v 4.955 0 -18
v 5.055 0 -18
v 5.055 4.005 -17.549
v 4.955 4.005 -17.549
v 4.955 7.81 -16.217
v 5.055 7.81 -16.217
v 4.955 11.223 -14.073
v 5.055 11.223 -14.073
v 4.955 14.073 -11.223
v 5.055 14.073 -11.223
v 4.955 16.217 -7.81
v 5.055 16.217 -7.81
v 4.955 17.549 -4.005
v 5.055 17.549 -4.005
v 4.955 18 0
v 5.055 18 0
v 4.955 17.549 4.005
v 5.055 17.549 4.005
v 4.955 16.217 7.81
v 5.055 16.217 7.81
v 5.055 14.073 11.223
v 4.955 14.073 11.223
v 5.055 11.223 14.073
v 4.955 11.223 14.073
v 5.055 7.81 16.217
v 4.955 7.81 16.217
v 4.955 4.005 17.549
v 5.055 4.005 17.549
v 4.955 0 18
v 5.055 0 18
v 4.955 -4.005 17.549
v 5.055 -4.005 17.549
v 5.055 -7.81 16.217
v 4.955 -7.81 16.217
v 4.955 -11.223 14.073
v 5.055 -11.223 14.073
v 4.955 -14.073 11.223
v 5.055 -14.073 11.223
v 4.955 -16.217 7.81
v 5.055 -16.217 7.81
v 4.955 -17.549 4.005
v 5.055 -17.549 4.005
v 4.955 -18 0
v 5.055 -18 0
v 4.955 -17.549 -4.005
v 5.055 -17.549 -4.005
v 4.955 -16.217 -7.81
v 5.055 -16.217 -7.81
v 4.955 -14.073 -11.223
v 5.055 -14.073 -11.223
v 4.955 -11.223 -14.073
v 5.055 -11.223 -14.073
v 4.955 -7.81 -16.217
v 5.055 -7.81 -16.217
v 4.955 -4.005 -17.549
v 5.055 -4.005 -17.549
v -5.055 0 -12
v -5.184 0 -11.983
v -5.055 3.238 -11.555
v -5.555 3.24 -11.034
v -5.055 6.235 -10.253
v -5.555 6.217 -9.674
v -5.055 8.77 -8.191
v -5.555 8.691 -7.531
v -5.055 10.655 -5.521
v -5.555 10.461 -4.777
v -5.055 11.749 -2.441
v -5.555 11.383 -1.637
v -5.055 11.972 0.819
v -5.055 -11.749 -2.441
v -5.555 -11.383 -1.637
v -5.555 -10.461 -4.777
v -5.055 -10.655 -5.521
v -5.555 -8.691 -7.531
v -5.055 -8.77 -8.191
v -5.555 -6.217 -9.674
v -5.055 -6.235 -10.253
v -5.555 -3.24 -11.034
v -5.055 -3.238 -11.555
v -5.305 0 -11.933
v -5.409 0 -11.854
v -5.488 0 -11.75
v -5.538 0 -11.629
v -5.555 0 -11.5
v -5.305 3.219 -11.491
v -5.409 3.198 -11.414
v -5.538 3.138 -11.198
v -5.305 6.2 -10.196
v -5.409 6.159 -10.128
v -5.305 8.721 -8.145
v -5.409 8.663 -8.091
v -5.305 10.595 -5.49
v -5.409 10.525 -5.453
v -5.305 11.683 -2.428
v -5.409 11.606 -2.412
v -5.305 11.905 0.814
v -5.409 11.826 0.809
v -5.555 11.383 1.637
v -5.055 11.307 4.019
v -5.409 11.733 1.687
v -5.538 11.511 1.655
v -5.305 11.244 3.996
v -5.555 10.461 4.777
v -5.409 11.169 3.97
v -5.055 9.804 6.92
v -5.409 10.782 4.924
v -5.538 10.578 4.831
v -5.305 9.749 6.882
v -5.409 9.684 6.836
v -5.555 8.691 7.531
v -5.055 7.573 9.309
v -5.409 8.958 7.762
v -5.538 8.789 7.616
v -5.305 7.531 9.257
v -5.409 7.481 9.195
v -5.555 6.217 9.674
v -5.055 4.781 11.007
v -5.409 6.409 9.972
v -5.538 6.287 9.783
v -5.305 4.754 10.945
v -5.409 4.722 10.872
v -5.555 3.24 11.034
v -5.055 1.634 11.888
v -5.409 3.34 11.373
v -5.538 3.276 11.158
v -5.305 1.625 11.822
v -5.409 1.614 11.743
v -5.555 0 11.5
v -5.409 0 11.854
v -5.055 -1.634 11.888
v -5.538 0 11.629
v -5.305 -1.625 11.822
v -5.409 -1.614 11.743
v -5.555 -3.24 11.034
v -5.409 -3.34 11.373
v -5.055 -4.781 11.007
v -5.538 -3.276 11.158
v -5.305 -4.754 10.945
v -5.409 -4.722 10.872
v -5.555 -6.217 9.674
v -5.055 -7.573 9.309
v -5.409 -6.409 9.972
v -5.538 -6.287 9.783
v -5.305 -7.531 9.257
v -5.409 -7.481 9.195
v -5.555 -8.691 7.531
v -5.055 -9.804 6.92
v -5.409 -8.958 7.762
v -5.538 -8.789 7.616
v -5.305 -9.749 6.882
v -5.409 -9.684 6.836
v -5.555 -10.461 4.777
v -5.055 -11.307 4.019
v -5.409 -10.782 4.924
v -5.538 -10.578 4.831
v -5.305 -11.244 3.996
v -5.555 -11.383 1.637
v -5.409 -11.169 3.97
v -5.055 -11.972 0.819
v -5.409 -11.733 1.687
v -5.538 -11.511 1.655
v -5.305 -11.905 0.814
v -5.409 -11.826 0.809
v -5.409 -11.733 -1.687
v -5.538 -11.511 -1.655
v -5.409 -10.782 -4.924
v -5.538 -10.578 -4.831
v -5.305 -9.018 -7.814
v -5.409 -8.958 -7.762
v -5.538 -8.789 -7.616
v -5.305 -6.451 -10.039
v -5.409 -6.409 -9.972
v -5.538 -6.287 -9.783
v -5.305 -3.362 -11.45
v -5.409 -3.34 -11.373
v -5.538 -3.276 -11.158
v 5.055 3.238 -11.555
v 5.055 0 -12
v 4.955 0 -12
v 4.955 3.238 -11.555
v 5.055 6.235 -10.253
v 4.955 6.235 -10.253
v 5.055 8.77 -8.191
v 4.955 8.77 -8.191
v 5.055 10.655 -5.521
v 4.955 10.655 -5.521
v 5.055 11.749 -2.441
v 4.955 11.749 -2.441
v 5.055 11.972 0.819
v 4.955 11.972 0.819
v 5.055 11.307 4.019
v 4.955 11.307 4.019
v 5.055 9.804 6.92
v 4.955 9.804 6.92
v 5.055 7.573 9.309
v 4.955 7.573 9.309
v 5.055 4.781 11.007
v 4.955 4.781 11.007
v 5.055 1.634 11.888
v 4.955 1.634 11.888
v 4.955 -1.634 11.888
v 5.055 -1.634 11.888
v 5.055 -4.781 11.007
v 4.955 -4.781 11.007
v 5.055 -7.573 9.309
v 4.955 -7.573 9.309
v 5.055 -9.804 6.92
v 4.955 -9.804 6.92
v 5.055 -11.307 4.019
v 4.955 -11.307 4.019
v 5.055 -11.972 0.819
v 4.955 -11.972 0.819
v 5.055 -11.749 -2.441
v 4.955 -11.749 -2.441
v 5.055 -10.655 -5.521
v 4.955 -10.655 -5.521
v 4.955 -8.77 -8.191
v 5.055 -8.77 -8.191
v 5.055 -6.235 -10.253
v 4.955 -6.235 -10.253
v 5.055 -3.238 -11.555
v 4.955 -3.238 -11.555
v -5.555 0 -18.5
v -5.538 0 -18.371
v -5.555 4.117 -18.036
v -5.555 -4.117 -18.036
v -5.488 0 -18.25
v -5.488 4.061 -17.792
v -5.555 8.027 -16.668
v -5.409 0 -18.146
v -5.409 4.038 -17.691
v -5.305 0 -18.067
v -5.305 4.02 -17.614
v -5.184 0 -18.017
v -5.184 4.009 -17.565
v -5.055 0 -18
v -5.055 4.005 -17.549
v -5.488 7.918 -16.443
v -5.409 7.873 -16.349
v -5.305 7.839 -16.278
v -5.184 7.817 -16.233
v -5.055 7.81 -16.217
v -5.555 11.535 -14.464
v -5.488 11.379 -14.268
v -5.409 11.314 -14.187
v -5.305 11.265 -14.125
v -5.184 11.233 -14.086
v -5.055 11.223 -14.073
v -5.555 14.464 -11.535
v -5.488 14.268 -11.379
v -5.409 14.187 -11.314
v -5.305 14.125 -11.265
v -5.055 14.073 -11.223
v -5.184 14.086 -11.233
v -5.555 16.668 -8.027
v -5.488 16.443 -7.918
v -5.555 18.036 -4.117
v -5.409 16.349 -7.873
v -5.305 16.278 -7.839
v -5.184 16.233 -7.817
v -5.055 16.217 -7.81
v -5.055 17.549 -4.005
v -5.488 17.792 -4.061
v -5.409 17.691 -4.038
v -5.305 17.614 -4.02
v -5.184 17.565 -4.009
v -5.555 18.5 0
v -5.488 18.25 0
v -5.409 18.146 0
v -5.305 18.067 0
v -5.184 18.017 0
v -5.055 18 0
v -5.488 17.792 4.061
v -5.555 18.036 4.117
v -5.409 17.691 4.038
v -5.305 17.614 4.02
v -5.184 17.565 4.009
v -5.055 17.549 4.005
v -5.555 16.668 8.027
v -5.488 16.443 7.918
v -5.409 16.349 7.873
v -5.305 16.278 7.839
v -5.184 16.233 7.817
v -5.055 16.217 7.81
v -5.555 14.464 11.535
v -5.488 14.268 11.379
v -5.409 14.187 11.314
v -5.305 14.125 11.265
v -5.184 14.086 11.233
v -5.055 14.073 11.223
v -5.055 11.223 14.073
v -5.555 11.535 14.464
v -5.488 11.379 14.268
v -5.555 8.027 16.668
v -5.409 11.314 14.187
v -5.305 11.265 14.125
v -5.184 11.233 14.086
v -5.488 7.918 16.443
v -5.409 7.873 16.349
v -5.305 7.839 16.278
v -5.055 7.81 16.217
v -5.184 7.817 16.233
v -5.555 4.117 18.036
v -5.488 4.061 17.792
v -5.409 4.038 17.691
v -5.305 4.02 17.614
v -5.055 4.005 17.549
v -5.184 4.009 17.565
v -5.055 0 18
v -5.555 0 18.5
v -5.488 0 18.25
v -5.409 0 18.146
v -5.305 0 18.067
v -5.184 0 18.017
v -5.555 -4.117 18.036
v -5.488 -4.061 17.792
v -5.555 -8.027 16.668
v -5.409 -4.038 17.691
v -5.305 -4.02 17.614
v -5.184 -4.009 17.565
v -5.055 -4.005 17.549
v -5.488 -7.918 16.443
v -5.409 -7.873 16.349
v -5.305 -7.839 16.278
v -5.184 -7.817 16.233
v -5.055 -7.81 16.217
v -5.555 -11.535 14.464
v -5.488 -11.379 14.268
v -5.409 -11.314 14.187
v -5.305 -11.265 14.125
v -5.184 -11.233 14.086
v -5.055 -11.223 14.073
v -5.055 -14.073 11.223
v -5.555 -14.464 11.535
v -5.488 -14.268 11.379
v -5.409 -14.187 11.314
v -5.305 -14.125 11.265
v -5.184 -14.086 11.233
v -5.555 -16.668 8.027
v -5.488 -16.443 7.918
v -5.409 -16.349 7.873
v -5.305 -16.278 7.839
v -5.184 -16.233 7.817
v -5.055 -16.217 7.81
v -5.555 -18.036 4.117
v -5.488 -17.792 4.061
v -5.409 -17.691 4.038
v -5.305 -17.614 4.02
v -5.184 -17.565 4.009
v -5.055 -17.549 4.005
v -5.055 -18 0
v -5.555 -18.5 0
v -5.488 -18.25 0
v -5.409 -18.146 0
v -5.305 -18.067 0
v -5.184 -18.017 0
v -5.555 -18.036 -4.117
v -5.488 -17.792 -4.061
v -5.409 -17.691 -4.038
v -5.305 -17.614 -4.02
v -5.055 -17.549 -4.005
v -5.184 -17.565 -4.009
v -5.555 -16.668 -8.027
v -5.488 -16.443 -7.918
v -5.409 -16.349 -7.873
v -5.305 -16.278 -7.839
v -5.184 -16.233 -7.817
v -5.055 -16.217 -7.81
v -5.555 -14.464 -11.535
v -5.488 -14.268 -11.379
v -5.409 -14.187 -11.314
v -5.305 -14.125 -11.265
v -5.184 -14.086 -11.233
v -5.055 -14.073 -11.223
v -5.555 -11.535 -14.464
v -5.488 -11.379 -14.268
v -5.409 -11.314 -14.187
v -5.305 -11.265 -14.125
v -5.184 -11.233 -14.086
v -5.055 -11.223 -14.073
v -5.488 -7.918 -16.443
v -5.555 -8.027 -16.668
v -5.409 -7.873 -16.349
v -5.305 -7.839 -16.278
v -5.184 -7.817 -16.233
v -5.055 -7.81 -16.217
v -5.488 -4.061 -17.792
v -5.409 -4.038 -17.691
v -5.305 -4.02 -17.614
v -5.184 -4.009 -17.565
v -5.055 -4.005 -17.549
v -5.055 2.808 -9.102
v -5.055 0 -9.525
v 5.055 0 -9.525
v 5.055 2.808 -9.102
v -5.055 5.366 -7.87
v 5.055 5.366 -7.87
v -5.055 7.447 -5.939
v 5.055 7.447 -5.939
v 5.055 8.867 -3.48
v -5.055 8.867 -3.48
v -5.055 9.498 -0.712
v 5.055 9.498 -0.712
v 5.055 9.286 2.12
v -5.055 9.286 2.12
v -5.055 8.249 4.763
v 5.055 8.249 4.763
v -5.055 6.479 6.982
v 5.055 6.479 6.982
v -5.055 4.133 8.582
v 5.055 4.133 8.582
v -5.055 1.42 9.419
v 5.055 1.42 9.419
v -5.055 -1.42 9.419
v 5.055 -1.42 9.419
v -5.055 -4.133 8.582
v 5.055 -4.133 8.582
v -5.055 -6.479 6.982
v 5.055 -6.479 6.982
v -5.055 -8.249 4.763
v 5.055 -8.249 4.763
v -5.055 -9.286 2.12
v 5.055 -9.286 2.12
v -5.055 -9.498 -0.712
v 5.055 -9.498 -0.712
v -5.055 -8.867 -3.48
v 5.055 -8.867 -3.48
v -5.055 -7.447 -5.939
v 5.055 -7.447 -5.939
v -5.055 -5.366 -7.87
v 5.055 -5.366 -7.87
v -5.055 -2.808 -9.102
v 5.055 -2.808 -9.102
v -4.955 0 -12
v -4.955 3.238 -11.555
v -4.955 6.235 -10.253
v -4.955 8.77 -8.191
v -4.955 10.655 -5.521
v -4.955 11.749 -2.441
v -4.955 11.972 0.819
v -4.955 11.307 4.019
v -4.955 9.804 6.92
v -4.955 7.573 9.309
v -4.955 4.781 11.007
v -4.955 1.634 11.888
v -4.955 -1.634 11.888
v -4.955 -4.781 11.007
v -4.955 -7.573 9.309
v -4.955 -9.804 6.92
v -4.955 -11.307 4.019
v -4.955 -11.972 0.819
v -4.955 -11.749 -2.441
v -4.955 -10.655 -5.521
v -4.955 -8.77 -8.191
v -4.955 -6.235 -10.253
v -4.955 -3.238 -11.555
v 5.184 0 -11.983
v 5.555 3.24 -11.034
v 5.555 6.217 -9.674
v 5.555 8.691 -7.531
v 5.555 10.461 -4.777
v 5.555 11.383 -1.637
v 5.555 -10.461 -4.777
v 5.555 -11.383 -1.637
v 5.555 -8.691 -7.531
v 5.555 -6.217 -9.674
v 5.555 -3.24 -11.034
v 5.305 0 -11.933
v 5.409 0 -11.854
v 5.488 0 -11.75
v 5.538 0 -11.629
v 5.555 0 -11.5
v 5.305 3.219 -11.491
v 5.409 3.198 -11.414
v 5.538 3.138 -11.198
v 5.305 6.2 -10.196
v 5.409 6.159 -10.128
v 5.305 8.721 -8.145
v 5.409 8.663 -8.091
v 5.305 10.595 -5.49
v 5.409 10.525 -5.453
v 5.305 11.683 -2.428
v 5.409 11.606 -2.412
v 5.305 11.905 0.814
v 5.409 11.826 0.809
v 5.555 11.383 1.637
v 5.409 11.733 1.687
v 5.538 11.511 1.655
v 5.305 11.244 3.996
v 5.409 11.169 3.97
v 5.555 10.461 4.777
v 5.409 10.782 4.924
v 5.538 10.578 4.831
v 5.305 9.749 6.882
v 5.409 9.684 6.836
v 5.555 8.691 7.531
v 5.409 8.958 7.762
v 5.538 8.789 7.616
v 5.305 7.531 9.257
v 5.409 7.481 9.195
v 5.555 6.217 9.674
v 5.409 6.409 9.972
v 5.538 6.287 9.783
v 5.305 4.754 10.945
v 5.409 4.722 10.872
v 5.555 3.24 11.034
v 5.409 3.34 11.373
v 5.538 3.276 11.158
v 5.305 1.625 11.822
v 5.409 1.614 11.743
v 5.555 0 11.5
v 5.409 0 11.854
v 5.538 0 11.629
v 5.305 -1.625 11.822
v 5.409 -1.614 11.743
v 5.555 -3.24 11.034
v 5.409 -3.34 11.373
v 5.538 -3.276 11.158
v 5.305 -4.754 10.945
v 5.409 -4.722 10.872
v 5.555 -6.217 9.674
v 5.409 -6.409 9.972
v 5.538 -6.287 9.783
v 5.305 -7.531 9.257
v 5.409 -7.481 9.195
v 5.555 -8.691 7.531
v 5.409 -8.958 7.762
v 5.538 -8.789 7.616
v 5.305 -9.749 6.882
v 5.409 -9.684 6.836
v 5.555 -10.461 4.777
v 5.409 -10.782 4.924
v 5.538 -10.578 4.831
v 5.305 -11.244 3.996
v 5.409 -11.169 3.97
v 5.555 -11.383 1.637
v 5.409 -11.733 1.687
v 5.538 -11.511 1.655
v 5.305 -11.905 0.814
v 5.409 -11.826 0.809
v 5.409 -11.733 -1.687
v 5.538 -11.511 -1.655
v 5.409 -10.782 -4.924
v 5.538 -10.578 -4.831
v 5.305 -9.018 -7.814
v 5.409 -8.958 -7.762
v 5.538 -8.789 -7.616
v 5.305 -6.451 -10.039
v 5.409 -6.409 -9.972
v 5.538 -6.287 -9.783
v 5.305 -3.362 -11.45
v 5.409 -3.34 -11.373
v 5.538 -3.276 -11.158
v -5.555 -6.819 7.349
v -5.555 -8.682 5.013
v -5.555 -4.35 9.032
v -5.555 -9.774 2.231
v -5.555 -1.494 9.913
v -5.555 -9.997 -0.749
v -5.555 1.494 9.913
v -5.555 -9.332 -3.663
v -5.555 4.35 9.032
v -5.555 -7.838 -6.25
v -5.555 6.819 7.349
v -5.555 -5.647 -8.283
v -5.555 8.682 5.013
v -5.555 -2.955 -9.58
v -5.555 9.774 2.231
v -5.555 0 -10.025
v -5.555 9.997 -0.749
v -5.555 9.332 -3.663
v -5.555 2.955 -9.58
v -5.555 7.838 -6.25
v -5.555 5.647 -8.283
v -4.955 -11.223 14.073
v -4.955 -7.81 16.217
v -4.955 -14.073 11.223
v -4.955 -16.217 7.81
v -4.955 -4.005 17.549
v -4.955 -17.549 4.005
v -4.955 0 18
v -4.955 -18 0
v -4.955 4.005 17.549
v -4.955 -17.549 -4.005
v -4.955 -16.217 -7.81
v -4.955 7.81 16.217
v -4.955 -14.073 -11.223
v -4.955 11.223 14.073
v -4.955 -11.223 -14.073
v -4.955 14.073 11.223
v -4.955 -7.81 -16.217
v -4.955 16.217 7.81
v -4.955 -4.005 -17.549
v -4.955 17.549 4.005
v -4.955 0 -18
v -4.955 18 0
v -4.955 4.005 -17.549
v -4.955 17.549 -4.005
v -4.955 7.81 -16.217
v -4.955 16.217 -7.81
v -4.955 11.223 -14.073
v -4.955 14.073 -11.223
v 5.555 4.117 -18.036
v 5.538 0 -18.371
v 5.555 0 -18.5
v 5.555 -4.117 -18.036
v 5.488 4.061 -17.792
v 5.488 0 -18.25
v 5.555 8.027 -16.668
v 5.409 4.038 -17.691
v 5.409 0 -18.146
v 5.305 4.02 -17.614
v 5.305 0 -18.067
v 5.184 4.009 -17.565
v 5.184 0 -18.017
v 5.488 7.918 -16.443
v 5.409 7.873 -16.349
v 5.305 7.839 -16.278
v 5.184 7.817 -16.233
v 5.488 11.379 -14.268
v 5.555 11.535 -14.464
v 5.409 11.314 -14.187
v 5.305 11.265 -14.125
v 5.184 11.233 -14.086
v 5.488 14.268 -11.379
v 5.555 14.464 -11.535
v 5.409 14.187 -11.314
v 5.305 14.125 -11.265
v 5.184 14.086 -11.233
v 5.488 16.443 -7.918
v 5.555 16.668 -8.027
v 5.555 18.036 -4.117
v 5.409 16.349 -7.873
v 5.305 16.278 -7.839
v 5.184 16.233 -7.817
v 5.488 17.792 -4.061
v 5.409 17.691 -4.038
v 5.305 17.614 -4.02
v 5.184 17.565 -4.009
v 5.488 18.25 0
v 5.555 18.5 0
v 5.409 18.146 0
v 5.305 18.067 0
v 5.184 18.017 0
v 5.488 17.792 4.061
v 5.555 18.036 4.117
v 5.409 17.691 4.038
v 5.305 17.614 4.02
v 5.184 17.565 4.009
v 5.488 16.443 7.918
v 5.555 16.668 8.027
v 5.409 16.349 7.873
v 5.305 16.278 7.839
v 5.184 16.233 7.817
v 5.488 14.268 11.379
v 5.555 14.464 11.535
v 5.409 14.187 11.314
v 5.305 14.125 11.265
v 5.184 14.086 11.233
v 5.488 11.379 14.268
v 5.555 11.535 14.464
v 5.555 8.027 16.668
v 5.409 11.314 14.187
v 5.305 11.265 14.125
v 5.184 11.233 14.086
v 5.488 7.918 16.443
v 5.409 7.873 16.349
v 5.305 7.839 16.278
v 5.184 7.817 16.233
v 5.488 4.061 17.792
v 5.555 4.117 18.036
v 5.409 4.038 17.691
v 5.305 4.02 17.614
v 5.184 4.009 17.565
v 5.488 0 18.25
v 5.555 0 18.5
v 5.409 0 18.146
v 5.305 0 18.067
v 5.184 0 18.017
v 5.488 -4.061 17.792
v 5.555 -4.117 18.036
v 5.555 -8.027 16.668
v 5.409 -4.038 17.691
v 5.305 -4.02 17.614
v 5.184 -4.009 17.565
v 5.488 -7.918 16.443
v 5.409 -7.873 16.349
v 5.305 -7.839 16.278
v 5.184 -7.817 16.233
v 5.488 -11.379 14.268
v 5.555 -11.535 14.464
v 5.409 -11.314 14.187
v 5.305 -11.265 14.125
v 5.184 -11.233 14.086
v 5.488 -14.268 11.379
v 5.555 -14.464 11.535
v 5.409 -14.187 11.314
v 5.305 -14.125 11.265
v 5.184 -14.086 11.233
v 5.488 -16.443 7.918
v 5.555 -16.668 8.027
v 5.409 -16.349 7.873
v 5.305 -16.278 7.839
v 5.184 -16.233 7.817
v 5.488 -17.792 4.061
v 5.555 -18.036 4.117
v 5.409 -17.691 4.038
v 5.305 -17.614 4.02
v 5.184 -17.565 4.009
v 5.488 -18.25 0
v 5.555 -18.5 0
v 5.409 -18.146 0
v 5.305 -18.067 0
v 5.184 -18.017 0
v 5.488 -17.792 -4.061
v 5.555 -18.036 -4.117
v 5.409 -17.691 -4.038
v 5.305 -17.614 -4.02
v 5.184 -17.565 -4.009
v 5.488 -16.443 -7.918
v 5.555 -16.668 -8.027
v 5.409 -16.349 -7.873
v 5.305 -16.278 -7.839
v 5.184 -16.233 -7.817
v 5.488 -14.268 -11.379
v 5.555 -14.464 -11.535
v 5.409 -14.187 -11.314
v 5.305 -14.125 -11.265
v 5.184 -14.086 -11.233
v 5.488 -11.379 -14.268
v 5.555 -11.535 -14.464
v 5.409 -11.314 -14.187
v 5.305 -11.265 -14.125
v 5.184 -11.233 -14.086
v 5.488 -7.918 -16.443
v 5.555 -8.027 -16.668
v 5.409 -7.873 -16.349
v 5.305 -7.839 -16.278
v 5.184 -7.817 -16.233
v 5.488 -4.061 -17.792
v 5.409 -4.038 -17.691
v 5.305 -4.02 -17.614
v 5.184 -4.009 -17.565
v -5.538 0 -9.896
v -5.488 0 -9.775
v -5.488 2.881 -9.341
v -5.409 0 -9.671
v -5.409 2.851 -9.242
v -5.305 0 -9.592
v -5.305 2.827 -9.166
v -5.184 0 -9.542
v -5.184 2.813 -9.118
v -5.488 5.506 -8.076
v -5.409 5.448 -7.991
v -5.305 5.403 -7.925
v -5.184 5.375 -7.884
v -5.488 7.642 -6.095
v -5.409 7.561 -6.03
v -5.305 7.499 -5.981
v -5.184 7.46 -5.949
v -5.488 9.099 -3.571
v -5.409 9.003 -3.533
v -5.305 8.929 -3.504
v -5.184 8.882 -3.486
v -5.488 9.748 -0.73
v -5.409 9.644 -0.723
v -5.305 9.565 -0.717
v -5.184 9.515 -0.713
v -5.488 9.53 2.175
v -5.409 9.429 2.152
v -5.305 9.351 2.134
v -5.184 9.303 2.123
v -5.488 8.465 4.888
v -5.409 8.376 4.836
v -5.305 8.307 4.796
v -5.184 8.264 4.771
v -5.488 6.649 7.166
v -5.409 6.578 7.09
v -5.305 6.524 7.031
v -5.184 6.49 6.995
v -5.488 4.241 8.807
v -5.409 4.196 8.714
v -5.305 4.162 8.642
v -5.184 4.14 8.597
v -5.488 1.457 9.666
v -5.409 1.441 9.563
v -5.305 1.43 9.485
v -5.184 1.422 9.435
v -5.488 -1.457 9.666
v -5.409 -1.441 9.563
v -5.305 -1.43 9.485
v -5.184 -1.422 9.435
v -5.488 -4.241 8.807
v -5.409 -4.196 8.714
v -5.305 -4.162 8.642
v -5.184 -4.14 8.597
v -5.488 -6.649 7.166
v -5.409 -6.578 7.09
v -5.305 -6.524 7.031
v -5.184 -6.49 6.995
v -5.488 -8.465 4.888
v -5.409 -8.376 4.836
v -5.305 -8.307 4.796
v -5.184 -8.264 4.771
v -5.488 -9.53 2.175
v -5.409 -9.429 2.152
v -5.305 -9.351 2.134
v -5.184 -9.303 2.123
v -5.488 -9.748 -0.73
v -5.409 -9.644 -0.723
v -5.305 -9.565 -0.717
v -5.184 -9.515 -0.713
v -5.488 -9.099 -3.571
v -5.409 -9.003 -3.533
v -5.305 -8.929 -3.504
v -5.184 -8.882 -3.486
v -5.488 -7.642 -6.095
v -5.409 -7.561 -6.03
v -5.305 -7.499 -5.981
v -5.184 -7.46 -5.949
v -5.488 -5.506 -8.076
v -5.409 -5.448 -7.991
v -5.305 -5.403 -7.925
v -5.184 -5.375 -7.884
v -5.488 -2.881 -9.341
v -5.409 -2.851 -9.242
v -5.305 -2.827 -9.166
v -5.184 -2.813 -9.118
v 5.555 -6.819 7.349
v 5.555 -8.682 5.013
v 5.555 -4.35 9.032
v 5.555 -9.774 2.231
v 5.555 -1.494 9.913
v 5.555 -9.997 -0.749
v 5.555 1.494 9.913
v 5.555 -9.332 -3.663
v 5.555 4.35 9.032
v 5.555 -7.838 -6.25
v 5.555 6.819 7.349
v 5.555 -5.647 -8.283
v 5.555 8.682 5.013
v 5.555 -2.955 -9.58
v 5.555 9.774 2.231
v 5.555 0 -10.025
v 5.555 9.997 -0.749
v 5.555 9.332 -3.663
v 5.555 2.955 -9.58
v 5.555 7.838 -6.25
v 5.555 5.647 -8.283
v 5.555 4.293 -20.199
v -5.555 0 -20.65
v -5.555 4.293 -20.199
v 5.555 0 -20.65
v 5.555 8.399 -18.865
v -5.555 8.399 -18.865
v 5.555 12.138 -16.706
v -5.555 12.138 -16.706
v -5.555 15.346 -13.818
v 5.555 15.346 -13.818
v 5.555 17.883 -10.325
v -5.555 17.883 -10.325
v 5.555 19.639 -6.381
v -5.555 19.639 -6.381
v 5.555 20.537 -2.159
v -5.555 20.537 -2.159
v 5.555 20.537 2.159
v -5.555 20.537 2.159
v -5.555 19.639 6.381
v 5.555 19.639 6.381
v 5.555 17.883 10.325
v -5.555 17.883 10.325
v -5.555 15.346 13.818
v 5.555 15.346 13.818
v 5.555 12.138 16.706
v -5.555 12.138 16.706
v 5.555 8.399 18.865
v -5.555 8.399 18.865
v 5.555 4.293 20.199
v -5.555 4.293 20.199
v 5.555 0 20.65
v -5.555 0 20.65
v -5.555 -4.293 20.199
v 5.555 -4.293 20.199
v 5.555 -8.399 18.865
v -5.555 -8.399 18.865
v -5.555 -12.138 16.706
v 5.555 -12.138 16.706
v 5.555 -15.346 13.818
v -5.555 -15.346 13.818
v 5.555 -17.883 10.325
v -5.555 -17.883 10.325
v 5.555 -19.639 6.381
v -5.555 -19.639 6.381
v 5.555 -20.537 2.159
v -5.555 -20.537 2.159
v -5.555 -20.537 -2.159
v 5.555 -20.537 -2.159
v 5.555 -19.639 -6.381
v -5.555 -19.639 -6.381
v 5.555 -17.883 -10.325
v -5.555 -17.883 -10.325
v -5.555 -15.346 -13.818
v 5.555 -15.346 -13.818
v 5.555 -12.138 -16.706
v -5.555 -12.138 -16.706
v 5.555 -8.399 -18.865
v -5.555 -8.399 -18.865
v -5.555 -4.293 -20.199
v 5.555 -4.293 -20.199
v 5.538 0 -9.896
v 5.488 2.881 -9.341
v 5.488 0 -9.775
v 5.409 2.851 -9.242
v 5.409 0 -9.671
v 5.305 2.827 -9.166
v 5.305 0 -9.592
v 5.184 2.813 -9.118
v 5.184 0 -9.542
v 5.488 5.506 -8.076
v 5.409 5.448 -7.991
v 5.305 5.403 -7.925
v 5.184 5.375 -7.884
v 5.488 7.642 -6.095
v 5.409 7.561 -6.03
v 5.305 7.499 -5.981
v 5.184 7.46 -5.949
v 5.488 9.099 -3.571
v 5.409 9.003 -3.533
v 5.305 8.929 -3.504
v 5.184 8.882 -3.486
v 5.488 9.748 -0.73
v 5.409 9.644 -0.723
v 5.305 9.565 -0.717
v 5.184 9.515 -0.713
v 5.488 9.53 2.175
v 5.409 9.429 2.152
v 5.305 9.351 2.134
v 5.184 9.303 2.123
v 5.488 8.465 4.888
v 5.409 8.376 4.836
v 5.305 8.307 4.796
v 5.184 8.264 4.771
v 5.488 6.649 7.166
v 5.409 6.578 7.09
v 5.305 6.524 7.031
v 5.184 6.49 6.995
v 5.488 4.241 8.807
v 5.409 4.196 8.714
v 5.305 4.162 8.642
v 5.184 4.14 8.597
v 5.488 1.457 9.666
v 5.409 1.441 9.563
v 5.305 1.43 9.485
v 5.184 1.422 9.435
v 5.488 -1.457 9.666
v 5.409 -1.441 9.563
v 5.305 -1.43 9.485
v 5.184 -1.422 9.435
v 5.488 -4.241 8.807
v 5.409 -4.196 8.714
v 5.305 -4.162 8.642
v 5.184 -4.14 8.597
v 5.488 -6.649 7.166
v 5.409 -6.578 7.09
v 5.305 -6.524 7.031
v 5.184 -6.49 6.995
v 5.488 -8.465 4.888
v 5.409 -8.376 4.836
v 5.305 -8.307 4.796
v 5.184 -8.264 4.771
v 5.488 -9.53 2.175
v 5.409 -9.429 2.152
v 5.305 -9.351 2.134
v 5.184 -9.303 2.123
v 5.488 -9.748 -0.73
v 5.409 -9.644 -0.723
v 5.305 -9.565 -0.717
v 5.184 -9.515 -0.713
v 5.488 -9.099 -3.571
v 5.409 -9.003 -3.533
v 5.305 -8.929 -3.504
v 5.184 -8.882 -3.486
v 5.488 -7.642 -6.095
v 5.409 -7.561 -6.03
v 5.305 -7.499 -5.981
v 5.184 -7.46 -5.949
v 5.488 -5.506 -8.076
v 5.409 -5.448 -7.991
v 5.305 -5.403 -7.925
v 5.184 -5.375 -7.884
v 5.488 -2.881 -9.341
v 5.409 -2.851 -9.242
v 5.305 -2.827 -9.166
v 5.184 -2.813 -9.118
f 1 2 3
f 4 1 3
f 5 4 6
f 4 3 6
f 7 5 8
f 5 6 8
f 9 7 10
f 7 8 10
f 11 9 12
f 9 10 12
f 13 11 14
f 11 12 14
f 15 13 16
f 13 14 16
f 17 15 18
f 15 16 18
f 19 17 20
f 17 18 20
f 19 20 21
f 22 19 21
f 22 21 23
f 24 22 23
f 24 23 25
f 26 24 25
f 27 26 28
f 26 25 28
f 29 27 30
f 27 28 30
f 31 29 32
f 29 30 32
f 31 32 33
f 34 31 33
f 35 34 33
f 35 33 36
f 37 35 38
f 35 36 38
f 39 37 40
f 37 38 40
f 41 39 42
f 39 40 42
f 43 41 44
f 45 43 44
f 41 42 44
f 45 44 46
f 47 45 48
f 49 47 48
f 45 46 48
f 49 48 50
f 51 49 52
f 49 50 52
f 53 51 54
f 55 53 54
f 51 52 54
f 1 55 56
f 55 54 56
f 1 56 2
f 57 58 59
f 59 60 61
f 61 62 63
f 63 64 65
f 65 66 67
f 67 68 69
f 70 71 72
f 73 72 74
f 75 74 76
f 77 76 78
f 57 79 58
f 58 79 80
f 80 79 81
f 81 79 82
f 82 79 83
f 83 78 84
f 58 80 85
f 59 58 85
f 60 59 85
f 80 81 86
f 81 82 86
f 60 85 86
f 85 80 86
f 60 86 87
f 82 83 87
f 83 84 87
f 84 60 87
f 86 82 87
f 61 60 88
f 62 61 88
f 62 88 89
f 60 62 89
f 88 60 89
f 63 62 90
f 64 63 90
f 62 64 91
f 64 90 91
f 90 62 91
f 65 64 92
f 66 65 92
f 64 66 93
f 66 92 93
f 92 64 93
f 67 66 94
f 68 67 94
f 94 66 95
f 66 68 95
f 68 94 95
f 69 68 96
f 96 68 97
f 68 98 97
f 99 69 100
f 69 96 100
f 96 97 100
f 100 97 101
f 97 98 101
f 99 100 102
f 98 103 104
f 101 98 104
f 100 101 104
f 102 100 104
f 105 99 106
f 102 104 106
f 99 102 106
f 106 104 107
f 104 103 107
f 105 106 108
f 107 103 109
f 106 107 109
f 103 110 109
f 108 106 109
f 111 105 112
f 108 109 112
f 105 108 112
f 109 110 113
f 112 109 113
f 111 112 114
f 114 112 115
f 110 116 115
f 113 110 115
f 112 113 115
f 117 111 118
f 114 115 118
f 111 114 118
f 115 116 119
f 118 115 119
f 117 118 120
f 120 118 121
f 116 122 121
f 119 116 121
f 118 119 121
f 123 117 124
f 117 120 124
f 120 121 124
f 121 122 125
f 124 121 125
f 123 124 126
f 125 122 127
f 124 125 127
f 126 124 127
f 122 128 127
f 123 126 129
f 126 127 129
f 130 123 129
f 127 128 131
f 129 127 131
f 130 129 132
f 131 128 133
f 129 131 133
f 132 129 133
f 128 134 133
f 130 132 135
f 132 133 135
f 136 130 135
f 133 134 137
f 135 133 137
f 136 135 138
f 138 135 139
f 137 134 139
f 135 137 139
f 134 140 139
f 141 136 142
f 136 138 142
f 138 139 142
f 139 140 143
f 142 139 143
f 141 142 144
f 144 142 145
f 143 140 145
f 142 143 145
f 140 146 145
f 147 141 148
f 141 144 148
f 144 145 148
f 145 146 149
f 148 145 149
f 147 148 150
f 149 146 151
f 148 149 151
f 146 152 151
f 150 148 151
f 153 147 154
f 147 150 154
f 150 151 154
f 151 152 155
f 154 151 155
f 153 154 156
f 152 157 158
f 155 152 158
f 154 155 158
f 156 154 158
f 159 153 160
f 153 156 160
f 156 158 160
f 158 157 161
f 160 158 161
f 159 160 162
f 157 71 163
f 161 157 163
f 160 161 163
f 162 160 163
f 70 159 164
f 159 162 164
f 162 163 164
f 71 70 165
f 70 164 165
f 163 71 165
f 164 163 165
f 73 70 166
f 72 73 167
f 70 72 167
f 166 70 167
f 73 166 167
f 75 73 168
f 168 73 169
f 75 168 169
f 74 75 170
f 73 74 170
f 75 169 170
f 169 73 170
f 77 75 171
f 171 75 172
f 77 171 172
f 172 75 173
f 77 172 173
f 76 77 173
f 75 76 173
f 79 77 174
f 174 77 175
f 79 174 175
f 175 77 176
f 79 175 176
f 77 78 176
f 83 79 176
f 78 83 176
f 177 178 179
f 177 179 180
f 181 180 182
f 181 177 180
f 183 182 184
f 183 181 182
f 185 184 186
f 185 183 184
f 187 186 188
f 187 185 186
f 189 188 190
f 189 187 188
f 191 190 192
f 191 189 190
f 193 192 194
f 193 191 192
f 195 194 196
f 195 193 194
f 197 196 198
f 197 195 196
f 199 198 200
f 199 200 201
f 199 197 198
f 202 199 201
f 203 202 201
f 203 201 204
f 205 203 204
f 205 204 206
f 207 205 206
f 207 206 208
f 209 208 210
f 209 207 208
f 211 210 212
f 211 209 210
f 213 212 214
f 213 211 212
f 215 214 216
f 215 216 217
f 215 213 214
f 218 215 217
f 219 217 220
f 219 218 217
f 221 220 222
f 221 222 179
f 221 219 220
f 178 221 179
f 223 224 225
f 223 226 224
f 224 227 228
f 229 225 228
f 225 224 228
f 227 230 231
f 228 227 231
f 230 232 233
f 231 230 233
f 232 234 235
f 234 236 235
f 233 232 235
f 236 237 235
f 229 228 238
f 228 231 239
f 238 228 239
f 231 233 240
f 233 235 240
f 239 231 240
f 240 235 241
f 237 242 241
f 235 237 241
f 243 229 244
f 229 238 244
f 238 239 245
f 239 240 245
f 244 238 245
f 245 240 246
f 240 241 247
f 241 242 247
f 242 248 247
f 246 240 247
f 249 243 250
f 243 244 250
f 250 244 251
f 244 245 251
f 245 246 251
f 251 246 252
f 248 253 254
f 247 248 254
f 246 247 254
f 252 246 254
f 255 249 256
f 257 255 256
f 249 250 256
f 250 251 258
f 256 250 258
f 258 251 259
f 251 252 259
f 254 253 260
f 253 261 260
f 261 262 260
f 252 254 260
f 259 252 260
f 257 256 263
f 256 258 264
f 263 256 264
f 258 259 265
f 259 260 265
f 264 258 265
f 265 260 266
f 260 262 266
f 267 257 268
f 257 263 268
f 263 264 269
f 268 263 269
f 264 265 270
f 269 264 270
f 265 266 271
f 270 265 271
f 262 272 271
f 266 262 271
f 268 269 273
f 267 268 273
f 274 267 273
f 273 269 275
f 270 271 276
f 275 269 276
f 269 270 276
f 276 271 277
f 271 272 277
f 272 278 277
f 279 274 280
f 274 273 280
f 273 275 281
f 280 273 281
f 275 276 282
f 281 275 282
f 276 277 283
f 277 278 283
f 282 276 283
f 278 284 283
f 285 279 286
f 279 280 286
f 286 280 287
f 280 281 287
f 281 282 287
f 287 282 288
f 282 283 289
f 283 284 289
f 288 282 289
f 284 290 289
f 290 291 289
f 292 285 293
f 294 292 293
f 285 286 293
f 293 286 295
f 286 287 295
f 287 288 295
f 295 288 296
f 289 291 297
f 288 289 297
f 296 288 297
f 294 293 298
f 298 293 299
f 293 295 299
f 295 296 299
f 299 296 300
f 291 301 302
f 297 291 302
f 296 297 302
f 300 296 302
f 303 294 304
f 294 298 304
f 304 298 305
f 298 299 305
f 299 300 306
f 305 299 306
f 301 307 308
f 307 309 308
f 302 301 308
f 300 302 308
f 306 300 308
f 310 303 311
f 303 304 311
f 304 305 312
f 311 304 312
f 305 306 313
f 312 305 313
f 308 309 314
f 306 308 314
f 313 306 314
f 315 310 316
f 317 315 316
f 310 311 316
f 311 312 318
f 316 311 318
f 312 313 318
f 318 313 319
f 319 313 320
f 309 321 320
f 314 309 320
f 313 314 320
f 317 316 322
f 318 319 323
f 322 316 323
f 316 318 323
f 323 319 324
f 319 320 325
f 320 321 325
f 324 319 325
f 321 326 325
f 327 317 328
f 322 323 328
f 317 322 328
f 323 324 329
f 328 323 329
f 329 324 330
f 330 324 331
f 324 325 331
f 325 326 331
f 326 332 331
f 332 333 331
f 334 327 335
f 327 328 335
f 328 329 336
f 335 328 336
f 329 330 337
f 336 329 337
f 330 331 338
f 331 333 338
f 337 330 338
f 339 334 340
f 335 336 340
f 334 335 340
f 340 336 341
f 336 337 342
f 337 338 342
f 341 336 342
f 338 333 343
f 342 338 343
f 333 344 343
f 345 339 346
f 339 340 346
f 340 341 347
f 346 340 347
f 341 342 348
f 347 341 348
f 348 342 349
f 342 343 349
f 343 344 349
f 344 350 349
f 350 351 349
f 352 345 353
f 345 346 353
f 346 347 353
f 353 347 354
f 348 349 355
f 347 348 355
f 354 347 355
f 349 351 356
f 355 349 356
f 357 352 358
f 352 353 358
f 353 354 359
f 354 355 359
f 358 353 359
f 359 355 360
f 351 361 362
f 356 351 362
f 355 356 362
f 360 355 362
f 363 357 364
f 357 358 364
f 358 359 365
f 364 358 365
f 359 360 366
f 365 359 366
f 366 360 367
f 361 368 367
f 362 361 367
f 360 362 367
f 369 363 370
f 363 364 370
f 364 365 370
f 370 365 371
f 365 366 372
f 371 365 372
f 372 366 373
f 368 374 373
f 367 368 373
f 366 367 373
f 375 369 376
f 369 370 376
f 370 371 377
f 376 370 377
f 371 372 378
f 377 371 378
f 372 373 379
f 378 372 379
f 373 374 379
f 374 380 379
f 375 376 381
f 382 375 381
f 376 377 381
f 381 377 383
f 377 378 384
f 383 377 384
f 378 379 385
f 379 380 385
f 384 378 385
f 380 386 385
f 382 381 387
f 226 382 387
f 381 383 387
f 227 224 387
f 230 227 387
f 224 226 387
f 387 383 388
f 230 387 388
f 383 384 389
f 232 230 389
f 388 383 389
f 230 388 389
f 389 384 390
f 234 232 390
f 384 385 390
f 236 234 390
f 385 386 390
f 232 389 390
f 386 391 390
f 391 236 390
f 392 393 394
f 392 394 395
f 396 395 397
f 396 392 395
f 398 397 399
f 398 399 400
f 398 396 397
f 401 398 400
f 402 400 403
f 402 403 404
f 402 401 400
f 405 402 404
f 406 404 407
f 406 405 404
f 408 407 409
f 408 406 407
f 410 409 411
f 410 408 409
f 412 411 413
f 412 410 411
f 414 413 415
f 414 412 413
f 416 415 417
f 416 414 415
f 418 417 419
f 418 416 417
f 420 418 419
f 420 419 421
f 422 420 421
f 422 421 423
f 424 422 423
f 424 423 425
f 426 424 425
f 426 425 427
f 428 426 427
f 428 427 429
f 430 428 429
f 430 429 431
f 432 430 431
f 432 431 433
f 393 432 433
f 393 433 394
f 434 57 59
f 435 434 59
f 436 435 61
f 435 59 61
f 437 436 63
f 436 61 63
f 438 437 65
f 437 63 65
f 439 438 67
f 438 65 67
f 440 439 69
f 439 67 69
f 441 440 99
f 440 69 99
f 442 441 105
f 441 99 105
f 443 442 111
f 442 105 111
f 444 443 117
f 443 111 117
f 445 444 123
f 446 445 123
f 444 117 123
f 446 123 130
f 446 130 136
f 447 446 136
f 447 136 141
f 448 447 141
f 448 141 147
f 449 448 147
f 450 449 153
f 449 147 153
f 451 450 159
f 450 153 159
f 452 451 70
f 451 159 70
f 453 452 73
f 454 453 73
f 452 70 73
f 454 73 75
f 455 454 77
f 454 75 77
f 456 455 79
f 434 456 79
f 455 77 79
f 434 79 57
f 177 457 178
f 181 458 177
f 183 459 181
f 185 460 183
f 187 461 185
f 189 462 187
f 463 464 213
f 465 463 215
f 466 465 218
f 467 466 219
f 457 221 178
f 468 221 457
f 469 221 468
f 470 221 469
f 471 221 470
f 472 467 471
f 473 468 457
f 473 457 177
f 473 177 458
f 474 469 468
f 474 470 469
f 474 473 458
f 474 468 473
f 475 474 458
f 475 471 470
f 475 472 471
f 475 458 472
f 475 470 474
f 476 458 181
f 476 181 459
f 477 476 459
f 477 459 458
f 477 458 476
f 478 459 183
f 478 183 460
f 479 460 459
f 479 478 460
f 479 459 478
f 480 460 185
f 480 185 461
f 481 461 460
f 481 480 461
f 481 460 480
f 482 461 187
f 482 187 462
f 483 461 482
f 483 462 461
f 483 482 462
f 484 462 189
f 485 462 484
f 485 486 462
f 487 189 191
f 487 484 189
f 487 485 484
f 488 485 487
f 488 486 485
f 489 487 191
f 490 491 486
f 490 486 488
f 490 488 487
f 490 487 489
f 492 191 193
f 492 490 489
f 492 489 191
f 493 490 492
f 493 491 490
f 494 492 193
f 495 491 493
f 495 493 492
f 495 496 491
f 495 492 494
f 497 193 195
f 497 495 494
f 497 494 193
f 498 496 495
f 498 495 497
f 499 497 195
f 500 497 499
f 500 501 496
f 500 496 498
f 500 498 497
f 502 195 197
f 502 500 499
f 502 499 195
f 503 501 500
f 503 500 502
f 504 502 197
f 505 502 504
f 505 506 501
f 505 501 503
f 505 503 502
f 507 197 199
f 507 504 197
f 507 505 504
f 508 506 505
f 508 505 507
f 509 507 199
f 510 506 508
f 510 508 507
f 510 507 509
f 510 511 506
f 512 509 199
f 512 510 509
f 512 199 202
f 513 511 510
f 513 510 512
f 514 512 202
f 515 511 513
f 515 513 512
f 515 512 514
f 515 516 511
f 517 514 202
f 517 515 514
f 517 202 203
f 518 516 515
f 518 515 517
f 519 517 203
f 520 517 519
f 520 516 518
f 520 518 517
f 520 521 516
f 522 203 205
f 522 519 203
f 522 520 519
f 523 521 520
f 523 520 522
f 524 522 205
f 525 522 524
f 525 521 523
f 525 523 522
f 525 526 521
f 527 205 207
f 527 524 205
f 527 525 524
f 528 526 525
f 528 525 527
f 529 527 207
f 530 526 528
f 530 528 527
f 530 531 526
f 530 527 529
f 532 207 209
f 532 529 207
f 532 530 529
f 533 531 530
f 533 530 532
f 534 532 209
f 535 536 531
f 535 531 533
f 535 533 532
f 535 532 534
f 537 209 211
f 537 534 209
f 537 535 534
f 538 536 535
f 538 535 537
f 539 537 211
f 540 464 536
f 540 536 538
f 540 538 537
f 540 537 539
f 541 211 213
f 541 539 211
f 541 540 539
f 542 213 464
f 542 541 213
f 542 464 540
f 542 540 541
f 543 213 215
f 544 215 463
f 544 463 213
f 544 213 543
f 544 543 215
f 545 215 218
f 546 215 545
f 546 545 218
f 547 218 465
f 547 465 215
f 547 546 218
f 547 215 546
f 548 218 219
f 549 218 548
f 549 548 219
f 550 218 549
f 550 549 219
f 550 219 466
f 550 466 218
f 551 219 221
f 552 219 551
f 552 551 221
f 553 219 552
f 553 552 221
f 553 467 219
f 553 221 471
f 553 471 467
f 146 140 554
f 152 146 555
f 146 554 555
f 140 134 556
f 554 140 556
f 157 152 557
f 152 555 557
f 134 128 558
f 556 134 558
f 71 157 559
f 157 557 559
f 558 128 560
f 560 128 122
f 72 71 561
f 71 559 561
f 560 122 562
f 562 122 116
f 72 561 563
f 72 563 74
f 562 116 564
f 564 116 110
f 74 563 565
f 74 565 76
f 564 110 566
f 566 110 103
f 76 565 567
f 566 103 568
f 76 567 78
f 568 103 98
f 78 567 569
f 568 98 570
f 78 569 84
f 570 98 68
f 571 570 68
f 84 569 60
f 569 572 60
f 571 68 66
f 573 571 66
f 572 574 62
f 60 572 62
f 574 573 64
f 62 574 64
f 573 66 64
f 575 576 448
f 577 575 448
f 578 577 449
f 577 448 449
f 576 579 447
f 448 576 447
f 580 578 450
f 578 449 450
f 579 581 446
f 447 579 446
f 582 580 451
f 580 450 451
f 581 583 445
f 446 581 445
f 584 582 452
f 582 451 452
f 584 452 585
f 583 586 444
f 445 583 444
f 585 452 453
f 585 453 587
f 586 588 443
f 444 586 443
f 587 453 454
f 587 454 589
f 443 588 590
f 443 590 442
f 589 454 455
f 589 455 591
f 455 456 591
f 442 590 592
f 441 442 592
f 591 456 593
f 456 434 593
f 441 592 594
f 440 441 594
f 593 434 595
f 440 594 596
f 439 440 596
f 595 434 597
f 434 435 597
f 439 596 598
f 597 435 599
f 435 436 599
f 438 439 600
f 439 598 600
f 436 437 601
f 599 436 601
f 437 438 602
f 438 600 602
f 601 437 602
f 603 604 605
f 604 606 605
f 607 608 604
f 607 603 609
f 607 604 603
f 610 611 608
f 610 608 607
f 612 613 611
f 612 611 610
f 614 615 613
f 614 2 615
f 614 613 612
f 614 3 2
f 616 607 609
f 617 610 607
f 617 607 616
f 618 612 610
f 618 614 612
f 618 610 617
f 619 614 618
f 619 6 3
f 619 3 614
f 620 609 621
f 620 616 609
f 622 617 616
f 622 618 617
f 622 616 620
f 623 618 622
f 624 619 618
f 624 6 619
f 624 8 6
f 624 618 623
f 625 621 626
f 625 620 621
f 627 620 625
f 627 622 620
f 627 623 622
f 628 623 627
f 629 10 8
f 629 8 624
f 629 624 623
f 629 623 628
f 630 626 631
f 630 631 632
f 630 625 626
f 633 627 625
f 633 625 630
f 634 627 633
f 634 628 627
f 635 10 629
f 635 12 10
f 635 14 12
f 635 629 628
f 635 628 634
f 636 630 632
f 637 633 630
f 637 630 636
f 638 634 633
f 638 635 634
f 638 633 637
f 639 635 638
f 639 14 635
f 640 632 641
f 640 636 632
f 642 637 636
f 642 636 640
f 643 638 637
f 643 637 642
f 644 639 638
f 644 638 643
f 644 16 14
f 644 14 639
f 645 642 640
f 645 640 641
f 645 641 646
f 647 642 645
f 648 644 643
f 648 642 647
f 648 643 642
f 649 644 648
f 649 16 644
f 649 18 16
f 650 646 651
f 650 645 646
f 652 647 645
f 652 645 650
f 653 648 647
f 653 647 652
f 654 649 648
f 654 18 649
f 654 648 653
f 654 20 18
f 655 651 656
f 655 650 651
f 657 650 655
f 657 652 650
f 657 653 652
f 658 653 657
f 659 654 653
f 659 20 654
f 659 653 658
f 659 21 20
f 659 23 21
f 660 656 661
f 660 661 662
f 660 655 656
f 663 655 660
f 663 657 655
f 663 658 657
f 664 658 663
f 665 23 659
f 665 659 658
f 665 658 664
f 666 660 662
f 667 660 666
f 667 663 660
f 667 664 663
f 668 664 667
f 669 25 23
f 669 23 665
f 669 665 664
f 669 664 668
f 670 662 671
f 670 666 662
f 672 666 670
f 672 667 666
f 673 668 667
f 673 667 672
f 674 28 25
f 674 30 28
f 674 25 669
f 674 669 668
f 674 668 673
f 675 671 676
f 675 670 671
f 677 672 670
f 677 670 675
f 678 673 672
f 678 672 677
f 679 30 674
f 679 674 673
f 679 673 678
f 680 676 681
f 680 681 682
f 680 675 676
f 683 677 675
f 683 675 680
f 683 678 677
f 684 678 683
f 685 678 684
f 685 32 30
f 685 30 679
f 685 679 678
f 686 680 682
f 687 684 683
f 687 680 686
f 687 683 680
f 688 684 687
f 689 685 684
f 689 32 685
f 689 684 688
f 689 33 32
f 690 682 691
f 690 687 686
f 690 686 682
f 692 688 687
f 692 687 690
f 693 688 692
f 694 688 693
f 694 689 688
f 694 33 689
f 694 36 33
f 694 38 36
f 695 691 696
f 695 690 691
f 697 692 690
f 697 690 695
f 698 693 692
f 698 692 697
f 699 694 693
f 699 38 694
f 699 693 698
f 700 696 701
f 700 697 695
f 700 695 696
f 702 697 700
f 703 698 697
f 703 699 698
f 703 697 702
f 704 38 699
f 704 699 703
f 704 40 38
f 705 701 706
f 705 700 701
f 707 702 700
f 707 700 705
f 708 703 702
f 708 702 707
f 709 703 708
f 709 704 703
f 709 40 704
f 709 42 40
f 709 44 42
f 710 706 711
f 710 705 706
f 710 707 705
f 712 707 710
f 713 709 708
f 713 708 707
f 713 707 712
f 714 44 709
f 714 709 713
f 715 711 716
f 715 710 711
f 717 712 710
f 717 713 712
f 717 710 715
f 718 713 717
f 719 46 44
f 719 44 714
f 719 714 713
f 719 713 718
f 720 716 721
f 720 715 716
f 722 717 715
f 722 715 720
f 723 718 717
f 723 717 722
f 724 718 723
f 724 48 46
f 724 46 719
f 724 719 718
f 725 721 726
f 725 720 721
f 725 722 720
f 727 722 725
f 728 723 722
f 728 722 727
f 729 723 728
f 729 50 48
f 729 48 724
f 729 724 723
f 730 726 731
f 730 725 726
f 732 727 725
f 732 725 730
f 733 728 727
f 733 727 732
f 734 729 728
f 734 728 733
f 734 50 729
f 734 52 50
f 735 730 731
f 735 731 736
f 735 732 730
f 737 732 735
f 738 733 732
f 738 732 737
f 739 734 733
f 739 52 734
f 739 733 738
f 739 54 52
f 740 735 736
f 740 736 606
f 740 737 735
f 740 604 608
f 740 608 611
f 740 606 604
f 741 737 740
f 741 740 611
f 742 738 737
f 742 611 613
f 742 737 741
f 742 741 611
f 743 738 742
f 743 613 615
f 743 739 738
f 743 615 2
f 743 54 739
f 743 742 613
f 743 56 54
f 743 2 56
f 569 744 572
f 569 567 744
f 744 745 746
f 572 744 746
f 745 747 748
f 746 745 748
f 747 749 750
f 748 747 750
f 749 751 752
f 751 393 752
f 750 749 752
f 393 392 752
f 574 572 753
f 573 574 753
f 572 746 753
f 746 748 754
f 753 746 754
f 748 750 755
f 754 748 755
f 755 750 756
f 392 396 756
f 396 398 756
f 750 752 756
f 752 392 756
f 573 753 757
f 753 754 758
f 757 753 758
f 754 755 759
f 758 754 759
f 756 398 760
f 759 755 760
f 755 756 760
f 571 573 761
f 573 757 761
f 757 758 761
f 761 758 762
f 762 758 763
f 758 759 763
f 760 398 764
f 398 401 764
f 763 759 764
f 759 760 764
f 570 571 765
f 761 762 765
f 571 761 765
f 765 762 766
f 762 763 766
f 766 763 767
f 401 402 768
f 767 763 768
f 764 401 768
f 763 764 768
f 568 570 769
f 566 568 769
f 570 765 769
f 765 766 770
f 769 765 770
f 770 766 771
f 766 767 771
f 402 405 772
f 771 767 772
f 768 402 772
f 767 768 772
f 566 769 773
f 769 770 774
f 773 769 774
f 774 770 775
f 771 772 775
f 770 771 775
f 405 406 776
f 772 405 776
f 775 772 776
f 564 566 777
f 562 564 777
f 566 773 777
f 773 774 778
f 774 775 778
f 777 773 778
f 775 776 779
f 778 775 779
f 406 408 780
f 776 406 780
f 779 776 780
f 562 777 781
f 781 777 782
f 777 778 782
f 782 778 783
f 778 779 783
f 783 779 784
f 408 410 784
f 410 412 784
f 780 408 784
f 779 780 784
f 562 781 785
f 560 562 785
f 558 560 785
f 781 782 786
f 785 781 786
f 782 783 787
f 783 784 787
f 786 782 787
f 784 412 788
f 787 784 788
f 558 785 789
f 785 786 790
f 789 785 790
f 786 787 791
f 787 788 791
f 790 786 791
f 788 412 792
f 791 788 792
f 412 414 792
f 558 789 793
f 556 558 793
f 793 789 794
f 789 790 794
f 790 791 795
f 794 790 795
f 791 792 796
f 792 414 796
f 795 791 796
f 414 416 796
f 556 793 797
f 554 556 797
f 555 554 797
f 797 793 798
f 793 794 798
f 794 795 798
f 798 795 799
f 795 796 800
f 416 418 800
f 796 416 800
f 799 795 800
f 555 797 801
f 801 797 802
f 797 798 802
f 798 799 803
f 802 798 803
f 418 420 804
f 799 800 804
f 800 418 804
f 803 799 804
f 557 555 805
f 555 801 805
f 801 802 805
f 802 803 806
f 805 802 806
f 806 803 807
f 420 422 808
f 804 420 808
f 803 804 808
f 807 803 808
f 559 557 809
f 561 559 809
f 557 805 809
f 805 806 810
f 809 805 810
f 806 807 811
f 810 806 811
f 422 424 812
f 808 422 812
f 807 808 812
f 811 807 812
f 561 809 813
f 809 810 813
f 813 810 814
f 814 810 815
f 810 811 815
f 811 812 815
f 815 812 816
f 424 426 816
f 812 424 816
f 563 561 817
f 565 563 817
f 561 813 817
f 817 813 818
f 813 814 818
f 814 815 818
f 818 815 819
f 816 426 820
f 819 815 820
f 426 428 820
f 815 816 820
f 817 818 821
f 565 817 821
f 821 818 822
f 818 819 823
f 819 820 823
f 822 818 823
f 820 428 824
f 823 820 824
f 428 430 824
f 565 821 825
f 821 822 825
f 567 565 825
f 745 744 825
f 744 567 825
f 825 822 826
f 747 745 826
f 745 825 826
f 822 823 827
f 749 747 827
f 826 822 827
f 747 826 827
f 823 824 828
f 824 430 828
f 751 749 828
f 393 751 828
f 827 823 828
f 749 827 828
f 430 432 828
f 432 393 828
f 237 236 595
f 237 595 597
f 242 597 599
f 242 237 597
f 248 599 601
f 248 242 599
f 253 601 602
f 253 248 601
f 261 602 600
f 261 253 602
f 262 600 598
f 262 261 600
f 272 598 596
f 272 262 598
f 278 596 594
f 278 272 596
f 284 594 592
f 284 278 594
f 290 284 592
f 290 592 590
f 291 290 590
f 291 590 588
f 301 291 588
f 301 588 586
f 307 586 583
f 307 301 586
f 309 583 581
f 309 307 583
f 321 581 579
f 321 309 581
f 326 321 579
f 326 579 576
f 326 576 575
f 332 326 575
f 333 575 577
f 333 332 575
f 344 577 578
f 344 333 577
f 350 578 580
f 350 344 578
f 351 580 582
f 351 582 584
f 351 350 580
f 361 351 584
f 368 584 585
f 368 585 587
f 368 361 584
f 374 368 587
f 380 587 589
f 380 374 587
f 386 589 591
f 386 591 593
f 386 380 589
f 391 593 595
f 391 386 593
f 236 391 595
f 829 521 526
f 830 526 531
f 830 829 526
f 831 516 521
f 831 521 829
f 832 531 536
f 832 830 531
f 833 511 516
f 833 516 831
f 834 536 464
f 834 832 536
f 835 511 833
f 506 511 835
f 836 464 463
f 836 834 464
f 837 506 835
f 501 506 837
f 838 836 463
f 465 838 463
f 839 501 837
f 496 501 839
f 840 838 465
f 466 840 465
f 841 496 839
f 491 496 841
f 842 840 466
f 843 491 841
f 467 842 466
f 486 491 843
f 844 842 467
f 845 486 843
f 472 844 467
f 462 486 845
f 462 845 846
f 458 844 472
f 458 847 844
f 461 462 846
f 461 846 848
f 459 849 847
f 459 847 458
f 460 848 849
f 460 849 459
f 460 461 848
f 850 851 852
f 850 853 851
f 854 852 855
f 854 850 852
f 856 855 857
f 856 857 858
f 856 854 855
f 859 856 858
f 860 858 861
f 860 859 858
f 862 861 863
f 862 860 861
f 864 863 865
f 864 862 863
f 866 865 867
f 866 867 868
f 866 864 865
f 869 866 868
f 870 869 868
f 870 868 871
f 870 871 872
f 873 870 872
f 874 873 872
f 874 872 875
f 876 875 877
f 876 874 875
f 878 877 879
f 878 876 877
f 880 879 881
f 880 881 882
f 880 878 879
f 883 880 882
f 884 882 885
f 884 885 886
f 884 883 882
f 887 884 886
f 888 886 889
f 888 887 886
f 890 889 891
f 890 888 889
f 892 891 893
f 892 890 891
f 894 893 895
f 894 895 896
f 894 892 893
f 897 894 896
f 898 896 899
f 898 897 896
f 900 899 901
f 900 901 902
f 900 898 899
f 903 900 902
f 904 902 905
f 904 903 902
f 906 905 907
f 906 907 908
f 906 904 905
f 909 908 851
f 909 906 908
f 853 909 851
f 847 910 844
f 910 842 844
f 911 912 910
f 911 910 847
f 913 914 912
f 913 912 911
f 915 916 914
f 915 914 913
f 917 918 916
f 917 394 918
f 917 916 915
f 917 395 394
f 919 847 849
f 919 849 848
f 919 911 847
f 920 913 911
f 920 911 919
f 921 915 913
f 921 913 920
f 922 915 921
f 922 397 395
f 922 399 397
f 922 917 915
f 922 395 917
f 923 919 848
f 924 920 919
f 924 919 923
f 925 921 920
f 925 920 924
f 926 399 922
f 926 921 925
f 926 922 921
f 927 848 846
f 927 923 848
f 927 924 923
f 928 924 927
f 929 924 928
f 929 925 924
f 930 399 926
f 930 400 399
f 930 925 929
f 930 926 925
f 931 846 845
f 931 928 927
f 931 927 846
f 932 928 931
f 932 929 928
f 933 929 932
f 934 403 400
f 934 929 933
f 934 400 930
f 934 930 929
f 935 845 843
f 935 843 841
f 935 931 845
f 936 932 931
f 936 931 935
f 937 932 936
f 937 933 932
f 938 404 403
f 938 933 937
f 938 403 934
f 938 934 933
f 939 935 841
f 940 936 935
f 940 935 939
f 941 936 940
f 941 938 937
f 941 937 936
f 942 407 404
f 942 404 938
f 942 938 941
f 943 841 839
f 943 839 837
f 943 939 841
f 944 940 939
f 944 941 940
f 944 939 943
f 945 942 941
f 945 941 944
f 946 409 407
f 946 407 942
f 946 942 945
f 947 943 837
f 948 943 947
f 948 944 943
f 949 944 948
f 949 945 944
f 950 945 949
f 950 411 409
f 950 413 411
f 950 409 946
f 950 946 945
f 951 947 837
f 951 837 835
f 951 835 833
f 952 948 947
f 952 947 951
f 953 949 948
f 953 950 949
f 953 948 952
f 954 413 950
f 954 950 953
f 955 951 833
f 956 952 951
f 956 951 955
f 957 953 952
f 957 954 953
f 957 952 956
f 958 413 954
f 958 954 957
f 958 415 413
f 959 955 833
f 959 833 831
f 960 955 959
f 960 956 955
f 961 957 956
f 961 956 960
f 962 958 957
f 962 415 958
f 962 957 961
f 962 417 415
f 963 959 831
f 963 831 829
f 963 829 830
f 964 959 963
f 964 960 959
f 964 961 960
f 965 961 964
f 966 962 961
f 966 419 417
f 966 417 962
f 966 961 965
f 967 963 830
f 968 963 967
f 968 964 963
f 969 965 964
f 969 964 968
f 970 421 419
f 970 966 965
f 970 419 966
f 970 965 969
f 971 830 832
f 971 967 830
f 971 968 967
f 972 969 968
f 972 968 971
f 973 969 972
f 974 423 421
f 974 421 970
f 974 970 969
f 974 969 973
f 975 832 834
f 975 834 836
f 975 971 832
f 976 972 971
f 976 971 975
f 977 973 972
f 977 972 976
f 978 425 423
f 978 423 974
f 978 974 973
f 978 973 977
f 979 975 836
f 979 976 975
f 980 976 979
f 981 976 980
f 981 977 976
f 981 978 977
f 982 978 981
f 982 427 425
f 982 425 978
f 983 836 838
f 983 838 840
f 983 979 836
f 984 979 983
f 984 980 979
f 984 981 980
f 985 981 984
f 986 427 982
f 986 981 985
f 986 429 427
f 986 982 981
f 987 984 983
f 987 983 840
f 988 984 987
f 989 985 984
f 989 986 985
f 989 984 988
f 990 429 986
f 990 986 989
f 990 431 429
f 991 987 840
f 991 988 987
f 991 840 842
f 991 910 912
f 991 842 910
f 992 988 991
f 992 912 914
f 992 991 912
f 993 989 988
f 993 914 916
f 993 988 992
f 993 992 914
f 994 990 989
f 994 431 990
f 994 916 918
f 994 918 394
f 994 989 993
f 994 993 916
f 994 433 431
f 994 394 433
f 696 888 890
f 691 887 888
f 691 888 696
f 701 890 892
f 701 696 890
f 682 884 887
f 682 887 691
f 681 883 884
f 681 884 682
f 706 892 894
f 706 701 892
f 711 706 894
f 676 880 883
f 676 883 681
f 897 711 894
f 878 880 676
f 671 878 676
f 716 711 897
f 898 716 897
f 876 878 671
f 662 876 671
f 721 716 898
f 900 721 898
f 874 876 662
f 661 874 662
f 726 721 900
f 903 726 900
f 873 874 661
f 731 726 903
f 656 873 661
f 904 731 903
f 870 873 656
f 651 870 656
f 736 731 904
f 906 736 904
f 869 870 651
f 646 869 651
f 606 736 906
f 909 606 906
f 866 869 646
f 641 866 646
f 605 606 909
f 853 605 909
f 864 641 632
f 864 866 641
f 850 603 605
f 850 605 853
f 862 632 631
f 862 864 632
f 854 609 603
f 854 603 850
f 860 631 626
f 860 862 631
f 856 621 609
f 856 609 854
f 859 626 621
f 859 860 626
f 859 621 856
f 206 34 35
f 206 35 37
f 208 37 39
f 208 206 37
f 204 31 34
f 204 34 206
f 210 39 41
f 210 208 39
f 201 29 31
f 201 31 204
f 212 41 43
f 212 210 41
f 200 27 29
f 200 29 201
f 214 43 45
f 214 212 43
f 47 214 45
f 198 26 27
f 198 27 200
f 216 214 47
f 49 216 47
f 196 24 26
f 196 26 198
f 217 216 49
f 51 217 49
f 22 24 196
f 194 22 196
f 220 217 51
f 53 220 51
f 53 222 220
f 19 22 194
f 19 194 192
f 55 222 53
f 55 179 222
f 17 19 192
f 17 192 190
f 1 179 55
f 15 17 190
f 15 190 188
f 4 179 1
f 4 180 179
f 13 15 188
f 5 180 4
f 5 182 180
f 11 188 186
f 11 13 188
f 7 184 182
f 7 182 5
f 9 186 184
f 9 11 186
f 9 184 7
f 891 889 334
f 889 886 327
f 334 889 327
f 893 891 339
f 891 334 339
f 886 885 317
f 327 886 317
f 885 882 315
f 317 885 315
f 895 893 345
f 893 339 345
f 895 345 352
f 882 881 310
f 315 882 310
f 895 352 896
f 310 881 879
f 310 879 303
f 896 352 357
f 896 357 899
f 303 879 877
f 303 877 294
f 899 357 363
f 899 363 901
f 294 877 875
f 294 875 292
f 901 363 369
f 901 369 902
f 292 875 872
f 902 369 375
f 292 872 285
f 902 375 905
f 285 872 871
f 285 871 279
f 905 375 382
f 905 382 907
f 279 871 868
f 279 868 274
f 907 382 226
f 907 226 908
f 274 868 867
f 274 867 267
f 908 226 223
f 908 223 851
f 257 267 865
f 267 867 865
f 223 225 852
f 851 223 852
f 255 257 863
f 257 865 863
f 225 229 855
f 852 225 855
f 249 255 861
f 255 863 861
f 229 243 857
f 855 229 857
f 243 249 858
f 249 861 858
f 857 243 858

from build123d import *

# Parameters (mm, degrees)
CROQUIS1_R              = 20.65
CROQUIS1_R_2            = 9.525
SALIENTE_EXTRUIR1_DEPTH = 5.555
CROQUIS2_R              = 18
CROQUIS2_R_2            = 12
CORTAR_EXTRUIR1_DEPTH   = 0.6
REDONDEO1_R             = 0.5


with BuildPart() as part:
    # Croquis1 → Saliente-Extruir1 (new, symmetric)
    with BuildSketch(Plane(origin=(0, 0, 0), x_dir=(0, 0, -1), z_dir=(1, 0, 0))):
        Circle(CROQUIS1_R)
        Circle(CROQUIS1_R_2, mode=Mode.SUBTRACT)
    extrude(amount=SALIENTE_EXTRUIR1_DEPTH, both=True)

    # Croquis2 → Cortar-Extruir1 (cut)
    with BuildSketch(Plane(origin=(5.555, 0, 0), x_dir=(0, 0, -1), z_dir=(1, 0, 0))):
        Circle(CROQUIS2_R)
        Circle(CROQUIS2_R_2, mode=Mode.SUBTRACT)
    cortar_extruir1 = extrude(amount=-CORTAR_EXTRUIR1_DEPTH, mode=Mode.SUBTRACT)

    # Simetría2: Cortar-Extruir1 across plane
    add(cortar_extruir1.mirror(Plane(origin=(0, 0, 0), x_dir=(0, 0, 1), z_dir=(1, 0, 0))), mode=Mode.SUBTRACT)

    # Redondeo1
    redondeo1_edges = [part.edges().sort_by_distance(p)[0] for p in [
        (5.555, 0, 18),
        (5.555, 0, 12),
        (-5.555, 0, 12),
        (-5.555, 0, 18),
        (-5.555, 0, 9.525),
        (5.555, 0, 9.525),
    ]]
    fillet(redondeo1_edges, radius=REDONDEO1_R)


solid = part.part
